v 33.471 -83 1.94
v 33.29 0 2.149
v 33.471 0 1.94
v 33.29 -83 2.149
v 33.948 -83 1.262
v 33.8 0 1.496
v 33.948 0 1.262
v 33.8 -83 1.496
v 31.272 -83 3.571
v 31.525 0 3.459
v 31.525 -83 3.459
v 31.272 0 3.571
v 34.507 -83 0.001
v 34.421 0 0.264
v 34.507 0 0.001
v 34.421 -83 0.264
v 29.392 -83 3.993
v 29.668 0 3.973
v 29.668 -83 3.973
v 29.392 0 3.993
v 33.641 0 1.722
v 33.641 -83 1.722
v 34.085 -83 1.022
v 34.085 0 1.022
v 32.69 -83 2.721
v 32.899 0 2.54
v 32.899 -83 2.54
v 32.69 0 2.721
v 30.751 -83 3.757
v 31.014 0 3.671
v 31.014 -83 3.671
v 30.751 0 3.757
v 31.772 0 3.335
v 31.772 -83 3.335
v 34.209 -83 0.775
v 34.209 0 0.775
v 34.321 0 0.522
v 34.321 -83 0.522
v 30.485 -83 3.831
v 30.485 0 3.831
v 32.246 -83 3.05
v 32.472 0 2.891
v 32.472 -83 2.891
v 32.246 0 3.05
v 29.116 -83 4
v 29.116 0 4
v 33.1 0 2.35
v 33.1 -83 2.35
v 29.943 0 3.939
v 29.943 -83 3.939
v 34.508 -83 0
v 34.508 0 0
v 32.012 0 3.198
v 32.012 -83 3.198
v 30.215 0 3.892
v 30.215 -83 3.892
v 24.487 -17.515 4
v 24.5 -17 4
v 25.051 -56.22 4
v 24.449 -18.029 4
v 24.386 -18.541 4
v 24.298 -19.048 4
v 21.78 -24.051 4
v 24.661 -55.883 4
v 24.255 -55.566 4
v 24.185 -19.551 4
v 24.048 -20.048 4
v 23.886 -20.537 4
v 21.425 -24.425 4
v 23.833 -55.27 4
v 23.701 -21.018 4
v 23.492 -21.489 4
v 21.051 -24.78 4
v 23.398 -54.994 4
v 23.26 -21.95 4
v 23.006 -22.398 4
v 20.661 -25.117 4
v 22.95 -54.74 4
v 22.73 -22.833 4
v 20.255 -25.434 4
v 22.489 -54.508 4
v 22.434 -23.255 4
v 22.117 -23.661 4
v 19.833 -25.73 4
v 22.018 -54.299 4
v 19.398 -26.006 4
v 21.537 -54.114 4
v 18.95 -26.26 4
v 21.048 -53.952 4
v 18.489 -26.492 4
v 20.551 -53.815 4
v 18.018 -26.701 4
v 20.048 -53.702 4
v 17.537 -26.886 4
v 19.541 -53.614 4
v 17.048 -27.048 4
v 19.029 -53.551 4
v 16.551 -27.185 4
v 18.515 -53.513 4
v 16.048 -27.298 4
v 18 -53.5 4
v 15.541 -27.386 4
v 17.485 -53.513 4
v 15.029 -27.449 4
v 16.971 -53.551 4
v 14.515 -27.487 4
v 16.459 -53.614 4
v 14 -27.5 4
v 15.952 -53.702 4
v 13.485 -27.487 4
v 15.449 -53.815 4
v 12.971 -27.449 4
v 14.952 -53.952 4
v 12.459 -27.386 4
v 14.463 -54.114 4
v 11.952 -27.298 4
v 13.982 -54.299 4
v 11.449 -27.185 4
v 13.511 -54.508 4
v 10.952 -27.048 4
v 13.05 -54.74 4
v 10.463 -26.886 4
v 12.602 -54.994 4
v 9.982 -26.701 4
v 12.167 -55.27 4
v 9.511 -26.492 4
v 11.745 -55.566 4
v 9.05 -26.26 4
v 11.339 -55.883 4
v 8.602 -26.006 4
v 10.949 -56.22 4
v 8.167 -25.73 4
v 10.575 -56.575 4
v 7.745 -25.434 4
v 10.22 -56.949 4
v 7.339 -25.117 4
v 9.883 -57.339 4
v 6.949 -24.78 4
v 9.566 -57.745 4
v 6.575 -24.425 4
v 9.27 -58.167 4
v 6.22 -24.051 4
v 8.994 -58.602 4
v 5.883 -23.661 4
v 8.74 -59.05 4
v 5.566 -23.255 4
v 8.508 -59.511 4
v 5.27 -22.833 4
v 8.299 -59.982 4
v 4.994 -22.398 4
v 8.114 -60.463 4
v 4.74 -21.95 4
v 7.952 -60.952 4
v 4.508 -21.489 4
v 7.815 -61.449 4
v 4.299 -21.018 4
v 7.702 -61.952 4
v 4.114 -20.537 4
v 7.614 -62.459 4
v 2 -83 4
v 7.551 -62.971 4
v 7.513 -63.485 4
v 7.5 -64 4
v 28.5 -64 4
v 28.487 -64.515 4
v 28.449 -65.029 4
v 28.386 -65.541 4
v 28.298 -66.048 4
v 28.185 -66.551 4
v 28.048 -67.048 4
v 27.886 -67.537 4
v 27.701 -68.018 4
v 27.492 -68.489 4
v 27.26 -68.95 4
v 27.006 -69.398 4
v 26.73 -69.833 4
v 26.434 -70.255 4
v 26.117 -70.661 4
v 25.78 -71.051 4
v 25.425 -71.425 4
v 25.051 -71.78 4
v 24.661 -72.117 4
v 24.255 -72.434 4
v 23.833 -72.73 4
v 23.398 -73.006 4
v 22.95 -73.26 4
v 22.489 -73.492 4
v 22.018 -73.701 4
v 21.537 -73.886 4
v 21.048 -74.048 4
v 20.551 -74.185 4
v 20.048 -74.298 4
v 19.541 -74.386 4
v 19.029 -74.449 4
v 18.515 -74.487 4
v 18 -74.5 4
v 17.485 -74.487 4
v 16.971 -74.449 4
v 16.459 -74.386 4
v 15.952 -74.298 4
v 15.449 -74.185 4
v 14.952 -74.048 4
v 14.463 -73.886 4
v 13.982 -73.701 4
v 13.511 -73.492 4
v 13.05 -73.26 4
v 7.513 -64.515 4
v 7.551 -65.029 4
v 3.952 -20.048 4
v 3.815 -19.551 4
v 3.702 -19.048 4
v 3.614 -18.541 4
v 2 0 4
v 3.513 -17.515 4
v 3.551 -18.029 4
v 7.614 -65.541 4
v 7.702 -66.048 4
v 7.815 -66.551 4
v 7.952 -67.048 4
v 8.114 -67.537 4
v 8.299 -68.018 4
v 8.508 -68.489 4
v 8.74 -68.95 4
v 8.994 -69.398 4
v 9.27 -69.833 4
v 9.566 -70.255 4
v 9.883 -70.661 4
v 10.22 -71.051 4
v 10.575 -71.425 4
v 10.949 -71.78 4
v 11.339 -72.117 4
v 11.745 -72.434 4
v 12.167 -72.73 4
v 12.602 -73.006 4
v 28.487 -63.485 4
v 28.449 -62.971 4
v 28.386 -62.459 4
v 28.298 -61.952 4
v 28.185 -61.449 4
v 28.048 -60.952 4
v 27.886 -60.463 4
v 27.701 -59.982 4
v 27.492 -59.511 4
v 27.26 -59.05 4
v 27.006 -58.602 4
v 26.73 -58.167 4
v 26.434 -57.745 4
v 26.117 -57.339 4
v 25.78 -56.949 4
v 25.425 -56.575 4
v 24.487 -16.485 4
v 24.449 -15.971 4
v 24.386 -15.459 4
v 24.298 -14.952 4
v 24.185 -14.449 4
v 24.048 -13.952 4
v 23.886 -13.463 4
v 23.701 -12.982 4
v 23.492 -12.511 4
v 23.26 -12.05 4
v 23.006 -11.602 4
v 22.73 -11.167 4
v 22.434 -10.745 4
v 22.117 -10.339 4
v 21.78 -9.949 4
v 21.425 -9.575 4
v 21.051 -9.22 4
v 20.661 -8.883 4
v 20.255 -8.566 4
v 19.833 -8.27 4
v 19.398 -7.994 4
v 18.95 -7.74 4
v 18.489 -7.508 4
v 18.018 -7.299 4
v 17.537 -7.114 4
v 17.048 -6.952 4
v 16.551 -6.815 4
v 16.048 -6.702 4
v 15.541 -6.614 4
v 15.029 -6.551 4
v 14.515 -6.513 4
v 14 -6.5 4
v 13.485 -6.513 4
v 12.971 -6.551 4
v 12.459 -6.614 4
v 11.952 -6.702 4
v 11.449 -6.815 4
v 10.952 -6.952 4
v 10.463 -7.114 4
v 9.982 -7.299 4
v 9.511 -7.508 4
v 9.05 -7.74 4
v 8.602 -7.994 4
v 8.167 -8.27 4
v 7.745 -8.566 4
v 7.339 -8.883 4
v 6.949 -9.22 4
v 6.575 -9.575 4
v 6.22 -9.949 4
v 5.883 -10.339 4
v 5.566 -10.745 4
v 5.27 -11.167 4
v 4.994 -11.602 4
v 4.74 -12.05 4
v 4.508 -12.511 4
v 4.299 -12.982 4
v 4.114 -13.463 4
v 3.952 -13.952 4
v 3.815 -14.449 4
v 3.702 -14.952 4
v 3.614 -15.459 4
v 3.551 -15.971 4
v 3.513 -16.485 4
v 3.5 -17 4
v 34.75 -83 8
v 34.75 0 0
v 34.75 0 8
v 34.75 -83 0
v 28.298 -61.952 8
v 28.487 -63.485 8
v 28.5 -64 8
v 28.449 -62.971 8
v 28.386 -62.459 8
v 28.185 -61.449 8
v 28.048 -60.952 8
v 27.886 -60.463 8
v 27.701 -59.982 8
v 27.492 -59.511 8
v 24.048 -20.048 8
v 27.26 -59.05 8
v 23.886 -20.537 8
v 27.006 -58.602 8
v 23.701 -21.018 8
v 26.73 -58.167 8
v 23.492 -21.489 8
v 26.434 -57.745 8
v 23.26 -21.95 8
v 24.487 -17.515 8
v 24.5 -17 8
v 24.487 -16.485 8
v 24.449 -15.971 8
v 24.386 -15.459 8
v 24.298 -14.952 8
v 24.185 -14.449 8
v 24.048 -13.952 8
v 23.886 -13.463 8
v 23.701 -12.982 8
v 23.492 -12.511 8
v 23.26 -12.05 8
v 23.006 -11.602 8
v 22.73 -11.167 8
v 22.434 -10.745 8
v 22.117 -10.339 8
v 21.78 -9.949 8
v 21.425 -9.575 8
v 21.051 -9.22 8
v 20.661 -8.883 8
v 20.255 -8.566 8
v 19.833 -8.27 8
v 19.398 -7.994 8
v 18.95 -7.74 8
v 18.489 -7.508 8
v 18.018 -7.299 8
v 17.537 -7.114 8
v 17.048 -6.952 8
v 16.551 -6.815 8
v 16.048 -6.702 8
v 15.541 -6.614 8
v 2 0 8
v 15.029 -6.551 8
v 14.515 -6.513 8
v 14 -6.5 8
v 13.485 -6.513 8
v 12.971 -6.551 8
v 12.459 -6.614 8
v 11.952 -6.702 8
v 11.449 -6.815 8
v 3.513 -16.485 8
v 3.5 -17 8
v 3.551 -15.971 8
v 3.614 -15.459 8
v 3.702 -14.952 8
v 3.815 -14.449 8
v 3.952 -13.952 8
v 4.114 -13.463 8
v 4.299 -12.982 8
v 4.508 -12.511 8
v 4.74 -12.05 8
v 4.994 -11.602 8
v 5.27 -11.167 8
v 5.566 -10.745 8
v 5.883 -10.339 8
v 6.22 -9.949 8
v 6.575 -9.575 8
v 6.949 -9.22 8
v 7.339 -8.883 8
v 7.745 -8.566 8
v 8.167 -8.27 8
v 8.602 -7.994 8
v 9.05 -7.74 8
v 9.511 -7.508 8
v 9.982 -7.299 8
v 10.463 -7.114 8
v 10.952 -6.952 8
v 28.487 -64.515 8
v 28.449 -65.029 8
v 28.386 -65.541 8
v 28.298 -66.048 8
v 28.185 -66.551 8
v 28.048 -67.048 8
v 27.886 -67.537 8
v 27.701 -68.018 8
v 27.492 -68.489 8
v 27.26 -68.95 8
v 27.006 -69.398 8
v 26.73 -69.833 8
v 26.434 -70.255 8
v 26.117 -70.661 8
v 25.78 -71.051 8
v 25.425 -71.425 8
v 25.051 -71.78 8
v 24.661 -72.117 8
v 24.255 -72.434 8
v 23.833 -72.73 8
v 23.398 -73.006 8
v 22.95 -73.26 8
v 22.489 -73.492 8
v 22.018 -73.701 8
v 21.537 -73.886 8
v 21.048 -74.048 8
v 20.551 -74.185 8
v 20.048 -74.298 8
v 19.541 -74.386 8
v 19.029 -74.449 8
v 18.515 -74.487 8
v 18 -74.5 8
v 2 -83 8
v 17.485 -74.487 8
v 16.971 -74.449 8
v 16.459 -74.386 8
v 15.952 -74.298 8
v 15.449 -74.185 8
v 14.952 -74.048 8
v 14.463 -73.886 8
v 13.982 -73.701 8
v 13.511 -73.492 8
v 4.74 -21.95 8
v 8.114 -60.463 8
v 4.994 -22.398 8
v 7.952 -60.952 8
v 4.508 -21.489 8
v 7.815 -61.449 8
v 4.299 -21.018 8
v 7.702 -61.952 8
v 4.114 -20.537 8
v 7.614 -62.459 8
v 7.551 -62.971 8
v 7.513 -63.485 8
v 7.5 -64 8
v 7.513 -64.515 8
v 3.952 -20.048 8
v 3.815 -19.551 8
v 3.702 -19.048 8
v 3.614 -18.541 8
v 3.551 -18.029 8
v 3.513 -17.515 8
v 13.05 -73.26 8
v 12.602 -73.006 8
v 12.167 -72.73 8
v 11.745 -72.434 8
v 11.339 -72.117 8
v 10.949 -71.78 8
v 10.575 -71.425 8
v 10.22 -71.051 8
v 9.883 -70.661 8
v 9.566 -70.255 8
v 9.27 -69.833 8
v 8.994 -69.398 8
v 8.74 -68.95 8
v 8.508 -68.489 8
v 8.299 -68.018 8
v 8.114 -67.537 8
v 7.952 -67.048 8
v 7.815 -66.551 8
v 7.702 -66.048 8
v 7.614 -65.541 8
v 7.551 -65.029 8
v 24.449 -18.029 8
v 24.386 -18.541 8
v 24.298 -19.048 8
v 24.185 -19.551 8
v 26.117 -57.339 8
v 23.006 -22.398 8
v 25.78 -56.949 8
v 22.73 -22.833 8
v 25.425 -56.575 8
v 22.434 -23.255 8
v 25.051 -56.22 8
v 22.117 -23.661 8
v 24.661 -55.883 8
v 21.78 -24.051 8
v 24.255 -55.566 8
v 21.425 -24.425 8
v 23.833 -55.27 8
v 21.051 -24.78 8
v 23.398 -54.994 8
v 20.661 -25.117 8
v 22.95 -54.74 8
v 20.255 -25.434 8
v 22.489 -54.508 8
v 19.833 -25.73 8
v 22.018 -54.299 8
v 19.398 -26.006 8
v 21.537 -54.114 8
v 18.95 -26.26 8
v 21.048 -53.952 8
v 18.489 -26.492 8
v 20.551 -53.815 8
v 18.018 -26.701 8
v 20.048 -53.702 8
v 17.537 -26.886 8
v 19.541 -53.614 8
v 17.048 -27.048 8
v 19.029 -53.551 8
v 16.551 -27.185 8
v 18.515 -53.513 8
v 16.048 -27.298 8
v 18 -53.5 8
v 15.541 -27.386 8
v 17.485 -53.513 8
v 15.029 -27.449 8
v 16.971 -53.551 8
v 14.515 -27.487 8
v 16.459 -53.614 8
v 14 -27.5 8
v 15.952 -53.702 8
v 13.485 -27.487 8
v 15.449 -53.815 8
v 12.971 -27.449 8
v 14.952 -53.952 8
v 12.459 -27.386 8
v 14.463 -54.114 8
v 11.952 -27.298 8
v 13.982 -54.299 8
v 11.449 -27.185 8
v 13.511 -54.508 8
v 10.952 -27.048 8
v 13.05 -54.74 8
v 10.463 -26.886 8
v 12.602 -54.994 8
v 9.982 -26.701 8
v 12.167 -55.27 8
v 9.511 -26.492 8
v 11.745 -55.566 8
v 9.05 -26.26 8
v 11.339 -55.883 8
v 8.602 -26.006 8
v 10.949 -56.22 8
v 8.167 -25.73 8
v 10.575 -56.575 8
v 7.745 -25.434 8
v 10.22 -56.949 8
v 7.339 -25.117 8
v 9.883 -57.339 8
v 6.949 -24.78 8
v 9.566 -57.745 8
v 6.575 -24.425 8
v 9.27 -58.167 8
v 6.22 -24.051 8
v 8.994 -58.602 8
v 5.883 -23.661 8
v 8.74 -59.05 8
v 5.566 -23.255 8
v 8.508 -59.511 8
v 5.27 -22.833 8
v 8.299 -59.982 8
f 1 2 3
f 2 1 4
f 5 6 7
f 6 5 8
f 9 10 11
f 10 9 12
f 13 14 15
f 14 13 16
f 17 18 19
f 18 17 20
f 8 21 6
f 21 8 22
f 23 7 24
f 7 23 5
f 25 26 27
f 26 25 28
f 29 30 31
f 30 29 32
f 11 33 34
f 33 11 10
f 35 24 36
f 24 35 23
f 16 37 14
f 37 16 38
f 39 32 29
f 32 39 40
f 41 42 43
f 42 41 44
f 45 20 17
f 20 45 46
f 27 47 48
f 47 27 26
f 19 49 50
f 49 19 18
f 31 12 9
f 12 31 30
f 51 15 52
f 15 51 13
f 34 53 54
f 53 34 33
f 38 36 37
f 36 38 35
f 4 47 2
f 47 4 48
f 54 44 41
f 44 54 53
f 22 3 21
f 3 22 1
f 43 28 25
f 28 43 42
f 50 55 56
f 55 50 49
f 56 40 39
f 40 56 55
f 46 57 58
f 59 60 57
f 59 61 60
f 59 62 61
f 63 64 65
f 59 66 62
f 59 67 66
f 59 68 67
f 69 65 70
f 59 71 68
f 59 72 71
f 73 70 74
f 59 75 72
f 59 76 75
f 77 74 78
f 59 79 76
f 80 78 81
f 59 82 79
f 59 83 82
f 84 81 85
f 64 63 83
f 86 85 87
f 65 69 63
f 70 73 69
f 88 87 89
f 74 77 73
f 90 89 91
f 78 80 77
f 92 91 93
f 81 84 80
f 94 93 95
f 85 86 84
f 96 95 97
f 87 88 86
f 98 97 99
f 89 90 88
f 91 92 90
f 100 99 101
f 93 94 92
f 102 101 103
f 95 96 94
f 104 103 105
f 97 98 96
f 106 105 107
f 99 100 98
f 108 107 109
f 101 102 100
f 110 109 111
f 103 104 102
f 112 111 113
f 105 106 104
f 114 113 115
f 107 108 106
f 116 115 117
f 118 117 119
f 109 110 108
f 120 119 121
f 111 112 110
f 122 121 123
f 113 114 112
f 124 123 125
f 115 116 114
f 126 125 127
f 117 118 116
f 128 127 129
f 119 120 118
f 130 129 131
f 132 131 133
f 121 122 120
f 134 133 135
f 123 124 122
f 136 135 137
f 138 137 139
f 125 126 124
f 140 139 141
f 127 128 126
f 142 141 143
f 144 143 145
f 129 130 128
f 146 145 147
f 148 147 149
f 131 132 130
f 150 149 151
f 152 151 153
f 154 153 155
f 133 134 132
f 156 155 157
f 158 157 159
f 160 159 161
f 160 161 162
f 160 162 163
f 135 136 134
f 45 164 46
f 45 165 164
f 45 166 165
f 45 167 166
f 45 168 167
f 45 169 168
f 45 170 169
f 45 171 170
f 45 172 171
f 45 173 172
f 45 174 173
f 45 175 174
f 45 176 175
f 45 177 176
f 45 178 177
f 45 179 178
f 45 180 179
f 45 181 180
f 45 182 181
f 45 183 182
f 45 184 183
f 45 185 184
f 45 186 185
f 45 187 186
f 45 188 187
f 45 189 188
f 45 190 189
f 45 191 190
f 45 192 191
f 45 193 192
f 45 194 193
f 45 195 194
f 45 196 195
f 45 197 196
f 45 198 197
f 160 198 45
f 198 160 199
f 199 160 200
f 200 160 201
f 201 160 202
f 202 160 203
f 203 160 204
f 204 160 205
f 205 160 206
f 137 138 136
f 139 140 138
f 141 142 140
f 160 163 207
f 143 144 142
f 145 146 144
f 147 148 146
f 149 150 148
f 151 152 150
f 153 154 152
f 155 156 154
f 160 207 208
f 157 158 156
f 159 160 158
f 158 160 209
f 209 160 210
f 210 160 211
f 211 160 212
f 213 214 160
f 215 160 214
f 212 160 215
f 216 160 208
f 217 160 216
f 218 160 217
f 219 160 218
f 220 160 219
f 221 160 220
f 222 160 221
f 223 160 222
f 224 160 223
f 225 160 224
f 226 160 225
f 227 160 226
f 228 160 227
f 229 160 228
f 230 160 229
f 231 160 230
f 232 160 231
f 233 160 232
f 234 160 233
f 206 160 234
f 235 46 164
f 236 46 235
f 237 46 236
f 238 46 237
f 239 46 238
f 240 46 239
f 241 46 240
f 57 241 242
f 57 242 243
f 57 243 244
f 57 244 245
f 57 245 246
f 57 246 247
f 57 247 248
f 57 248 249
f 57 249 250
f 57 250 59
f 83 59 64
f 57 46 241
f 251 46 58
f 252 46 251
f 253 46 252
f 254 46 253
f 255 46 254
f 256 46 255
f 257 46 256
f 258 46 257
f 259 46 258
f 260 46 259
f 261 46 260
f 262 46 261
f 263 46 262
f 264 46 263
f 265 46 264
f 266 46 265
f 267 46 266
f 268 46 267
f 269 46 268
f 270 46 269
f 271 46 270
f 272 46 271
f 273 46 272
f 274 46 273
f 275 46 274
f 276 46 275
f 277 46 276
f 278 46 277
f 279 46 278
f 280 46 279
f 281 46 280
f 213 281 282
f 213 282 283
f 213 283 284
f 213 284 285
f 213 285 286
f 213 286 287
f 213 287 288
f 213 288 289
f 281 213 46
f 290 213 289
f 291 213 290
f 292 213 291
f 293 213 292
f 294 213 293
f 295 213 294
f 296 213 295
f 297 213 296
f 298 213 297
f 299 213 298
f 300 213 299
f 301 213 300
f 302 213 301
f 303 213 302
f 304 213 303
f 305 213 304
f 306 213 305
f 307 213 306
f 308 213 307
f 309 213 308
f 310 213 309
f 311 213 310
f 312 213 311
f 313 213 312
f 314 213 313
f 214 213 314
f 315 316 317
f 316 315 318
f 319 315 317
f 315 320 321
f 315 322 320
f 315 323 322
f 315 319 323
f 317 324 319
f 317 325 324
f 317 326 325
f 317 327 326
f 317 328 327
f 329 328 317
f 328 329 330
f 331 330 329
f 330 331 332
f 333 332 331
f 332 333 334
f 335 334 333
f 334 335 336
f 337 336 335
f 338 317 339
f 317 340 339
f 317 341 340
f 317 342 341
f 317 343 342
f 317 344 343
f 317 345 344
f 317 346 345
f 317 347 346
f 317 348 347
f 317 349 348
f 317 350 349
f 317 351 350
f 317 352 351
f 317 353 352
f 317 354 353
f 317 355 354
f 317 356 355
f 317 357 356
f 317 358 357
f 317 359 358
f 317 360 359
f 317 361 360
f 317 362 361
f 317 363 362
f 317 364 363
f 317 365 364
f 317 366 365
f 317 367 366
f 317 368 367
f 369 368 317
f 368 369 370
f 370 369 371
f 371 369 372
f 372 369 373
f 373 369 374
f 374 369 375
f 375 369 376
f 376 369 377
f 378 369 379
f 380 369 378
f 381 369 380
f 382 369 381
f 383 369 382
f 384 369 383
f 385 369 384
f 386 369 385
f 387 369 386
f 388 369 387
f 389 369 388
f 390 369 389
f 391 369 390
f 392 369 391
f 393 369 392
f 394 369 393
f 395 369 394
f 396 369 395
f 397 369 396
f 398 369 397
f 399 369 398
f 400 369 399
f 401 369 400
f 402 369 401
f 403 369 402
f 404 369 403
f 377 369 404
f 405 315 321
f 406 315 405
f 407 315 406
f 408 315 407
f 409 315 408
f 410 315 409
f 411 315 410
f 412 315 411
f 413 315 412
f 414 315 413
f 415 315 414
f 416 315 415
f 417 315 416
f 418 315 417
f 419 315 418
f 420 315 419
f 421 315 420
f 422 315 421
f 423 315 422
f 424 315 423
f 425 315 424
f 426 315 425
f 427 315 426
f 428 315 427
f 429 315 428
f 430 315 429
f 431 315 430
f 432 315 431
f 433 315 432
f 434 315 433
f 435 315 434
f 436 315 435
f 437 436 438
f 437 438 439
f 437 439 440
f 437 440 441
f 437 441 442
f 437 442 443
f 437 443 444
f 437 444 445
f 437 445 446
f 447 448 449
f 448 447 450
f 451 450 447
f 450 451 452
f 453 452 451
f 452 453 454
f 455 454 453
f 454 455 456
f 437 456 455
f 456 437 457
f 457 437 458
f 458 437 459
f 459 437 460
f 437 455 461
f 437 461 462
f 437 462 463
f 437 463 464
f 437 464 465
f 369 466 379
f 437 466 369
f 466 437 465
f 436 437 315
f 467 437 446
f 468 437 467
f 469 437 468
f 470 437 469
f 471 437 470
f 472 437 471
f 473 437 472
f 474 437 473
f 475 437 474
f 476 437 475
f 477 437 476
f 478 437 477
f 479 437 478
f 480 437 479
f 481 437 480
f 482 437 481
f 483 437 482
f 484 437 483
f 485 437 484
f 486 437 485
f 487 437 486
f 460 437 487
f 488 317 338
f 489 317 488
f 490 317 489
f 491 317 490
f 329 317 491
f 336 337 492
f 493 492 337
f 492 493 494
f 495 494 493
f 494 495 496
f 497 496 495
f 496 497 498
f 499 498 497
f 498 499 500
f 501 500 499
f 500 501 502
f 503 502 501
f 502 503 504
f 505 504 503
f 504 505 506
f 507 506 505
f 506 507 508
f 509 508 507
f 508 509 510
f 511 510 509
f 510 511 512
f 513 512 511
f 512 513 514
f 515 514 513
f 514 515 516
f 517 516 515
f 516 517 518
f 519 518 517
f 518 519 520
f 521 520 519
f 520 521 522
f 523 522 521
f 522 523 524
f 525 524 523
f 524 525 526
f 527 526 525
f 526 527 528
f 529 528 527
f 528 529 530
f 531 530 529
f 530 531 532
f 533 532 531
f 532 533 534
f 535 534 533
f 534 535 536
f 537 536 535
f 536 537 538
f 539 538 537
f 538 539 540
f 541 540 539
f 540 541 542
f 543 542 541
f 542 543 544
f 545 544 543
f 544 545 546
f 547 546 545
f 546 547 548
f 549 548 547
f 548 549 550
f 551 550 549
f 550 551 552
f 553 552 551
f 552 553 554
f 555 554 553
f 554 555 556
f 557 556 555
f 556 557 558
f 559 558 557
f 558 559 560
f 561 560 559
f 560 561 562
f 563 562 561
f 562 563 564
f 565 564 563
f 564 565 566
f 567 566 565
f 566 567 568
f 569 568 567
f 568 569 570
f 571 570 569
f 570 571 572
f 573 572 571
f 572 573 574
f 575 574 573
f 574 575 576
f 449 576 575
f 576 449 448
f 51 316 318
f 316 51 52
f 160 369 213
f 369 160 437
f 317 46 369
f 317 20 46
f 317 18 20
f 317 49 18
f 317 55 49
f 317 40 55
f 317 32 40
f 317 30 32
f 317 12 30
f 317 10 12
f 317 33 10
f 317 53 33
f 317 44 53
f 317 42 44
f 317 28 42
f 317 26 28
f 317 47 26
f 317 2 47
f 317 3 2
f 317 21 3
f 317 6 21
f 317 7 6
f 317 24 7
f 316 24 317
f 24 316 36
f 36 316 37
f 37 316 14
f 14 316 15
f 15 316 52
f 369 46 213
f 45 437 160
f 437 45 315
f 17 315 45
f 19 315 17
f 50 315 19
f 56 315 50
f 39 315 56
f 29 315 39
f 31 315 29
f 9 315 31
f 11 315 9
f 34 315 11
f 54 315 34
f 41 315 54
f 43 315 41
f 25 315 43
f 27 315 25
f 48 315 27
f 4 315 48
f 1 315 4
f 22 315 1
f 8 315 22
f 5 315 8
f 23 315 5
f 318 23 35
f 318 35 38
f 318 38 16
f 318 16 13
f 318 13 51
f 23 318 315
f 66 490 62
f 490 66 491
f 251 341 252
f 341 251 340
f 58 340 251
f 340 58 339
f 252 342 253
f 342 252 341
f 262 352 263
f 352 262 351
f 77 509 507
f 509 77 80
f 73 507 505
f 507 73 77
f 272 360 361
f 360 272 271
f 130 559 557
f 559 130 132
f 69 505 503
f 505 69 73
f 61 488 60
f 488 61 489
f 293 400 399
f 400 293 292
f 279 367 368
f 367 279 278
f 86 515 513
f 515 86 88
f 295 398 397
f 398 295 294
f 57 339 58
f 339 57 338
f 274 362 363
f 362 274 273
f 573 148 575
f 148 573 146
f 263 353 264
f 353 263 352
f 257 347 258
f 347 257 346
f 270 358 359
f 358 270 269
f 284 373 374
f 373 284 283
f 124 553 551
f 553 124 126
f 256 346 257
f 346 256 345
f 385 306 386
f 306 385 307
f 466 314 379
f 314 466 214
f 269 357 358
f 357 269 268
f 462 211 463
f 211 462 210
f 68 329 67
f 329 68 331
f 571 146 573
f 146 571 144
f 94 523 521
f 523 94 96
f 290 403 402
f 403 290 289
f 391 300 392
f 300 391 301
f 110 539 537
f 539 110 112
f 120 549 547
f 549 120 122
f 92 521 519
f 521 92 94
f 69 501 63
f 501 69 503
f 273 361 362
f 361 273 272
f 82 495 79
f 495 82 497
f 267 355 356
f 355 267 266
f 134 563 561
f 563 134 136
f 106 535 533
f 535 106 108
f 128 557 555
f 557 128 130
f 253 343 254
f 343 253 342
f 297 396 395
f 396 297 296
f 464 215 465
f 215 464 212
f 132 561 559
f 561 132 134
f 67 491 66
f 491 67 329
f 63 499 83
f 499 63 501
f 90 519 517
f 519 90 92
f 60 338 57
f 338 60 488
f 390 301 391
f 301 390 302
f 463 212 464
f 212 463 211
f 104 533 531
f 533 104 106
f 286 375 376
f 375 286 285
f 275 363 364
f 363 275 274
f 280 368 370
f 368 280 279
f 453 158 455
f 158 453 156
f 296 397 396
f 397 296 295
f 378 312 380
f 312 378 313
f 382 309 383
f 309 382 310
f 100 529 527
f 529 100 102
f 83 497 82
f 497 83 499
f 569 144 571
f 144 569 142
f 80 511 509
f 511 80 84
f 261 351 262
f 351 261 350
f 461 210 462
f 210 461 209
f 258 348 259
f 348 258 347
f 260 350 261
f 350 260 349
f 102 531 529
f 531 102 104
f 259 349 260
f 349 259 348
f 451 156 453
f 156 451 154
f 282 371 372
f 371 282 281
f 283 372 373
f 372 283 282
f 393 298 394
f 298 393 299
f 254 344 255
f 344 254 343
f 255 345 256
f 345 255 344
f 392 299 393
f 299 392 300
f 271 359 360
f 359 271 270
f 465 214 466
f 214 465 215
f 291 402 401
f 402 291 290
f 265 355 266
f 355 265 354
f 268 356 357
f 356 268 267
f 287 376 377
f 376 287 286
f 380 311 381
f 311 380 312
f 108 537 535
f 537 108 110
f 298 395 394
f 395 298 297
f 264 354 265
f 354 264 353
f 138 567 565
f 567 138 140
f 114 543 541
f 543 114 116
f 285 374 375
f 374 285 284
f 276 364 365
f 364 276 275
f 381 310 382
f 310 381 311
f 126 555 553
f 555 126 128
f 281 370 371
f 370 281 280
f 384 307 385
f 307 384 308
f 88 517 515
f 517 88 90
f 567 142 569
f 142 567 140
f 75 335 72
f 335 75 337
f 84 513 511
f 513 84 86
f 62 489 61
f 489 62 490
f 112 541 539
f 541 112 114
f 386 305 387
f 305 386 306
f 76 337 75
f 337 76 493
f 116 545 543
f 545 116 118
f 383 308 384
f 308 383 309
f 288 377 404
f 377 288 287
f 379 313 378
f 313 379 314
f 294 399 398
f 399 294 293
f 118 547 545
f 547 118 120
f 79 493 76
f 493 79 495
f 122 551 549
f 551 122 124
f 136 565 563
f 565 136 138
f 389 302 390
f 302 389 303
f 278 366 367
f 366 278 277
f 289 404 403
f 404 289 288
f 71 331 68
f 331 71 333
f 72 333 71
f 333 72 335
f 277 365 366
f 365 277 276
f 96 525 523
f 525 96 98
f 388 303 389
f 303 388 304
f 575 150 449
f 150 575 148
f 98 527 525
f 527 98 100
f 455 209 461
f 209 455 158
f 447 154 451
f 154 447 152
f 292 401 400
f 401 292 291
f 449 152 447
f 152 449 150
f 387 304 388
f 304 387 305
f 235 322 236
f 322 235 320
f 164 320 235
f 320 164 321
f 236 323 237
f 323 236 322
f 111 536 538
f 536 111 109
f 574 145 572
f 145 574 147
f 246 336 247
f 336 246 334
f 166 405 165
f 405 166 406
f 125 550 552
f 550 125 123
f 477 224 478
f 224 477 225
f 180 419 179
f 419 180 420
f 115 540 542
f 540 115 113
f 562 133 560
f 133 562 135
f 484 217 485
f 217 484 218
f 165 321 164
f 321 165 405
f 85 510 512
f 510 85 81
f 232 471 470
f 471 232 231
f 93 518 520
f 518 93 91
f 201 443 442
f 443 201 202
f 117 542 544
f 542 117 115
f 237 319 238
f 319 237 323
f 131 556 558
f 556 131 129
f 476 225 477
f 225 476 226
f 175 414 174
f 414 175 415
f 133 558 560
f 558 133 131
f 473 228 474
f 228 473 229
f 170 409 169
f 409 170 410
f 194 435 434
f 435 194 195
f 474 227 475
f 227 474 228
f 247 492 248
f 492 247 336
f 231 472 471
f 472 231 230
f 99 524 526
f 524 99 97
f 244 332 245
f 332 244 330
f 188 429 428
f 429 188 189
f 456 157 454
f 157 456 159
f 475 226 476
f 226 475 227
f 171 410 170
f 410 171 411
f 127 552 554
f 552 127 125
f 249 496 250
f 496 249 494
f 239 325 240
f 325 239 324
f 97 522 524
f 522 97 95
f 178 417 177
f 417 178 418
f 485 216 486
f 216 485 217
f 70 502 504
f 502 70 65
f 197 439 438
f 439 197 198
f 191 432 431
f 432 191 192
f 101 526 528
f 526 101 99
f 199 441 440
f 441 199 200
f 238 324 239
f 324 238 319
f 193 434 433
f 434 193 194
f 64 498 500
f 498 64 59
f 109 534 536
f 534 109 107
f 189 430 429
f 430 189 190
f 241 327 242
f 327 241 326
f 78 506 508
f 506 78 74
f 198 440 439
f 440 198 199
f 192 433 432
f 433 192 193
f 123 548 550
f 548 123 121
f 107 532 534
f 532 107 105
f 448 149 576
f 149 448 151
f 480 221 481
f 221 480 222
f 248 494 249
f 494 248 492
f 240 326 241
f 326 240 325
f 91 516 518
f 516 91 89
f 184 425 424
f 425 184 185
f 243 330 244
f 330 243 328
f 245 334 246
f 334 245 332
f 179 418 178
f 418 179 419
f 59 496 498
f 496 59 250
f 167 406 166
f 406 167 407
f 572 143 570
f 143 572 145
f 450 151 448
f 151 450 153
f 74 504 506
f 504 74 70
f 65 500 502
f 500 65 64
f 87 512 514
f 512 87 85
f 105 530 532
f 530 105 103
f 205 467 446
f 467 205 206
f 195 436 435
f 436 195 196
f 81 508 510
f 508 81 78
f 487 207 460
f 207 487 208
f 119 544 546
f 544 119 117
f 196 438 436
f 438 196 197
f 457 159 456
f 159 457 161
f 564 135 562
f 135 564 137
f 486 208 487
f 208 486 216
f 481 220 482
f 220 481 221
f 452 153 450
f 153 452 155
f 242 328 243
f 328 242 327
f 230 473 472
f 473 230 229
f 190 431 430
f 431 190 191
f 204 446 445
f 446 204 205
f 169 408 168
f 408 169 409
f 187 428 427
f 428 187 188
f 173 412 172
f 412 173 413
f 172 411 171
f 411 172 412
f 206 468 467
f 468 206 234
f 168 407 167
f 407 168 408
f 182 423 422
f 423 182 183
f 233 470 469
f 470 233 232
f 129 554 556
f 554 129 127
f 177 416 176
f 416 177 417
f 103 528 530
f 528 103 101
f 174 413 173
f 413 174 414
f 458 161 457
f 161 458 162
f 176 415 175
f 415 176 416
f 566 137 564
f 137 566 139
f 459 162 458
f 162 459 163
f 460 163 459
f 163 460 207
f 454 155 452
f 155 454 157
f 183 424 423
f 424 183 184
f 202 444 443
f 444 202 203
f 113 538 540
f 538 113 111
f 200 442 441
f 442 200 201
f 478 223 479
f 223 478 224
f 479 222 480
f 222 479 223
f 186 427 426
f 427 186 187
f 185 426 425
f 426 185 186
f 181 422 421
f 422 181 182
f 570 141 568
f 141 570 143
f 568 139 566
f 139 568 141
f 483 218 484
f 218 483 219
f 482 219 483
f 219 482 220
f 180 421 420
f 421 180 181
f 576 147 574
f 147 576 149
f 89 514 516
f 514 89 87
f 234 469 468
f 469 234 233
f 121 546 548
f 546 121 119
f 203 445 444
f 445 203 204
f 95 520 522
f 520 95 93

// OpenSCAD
// file: LilWeatherPi_Fan.scad
// Dr.Gerg's Lil WeatherPi Vent Fan
// OpenSCAD definition file
// https://www.drgerg.com
// OpenSCAD Cheatsheet http://www.openscad.org/cheatsheet/index.html
//
// PARAMETER DEFINITIONS// PARAMETER DEFINITIONS
// 
wall = 1;  // how thick do you want the wall to be?
cornerDia = 7.68; // The diameter of the screw holes for the two pole contacts.
totLength = 40; // Total length of assembly.
totWidth = 40;  // Total width of assembly.
baseHt = 10.3; // Thickness of the fan only.
throat = 37.6; // diameter of fan.
screwR = 1.5; // radius of screw hole.

//
//// MAIN BODY OF BUILD
// COMPONENT BODY DEFINITION
//
module fanscrews(){
    translate([0,0,-19])
    cylinder(h=baseHt+20,r=screwR);
    translate([totLength-cornerDia,0,-19])
    cylinder(h=baseHt+20,r=screwR);
    translate([0,totWidth-cornerDia,-19])
    cylinder(h=baseHt+20,r=screwR);
    translate([totLength-cornerDia,totWidth-cornerDia,-19])
    cylinder(h=baseHt+20,r=screwR);
}
$fn=64;
module fanThroat(){
    translate([totLength/2-(cornerDia/2),totWidth/2-(cornerDia/2),-1])
    cylinder(h=baseHt+10,d=throat);
}


module fanFrame(){
        minkowski(){
        cube([totLength-cornerDia,totWidth-cornerDia,baseHt/2]);
        cylinder(baseHt/2,d=cornerDia);
        }
}


module fanbody(){
    union(){
        difference(){
                difference(){
                minkowski(){
                    cube([totLength-cornerDia,totWidth-cornerDia,baseHt/2]);
                    cylinder(baseHt/2,d=cornerDia);
                    }
                fanThroat();
                }
            fanscrews();
        }
    }
}
fanbody();
// main file
// Dr.Gerg's Battery Box
// OpenSCAD definition file
// https://www.drgerg.com
// OpenSCAD Cheatsheet http://www.openscad.org/cheatsheet/index.html
//
// PARAMETER DEFINITIONS// PARAMETER DEFINITIONS
// 
use <LilWeatherPi_Fan.scad>
wall = 2;  // how thick do you want the wall to be?
cornerDia = 11.2684; // The diameter of the filet on the back of the box.
totLength = 87; // Total length of assembly.
baseHt = 4; // Thickness of the base only.
// totWidth = 54;  // Total width of assembly.
totWidth = 33.1158;
filletAdd = 5.6342; // Added to cover curved edge on back of box.
fanx =16;
fany = -19;
fanz = 0;
// 34.75 altogether
//
//// MAIN BODY OF BUILD
// COMPONENT BODY DEFINITION
//

$fn=128;
module main(){
    difference(){
        translate([wall,-totLength+2*wall,0])
        cube([(totWidth-2*wall)+(cornerDia/2-wall),totLength-2*wall,baseHt*2]);
        union(){
            translate([0,-totLength+wall,-wall*2])
            cube([totWidth-2*wall,totLength,baseHt*2]);
            translate([cornerDia/2,+wall,0])
            intersection(){
                translate([0,-totLength,-wall])
                cube([totWidth-2*wall,totLength+2*wall,baseHt*2]);
                translate([totWidth-2*wall-cornerDia/2,+wall/2,-cornerDia/2+baseHt])
                rotate([90,0,0])
                cylinder(totLength,d=cornerDia,center=false);
            }
        }
    }
}
module baseAssy(){
    difference(){
        main();
        union(){
            translate([fanx-2,fany+2,fanz])
            #cylinder(h=20,d=21,center=true);
            translate([fanx+2,-64,fanz])
            #cylinder(h=20,d=21,center=true);
            }
    }


}

baseAssy();
